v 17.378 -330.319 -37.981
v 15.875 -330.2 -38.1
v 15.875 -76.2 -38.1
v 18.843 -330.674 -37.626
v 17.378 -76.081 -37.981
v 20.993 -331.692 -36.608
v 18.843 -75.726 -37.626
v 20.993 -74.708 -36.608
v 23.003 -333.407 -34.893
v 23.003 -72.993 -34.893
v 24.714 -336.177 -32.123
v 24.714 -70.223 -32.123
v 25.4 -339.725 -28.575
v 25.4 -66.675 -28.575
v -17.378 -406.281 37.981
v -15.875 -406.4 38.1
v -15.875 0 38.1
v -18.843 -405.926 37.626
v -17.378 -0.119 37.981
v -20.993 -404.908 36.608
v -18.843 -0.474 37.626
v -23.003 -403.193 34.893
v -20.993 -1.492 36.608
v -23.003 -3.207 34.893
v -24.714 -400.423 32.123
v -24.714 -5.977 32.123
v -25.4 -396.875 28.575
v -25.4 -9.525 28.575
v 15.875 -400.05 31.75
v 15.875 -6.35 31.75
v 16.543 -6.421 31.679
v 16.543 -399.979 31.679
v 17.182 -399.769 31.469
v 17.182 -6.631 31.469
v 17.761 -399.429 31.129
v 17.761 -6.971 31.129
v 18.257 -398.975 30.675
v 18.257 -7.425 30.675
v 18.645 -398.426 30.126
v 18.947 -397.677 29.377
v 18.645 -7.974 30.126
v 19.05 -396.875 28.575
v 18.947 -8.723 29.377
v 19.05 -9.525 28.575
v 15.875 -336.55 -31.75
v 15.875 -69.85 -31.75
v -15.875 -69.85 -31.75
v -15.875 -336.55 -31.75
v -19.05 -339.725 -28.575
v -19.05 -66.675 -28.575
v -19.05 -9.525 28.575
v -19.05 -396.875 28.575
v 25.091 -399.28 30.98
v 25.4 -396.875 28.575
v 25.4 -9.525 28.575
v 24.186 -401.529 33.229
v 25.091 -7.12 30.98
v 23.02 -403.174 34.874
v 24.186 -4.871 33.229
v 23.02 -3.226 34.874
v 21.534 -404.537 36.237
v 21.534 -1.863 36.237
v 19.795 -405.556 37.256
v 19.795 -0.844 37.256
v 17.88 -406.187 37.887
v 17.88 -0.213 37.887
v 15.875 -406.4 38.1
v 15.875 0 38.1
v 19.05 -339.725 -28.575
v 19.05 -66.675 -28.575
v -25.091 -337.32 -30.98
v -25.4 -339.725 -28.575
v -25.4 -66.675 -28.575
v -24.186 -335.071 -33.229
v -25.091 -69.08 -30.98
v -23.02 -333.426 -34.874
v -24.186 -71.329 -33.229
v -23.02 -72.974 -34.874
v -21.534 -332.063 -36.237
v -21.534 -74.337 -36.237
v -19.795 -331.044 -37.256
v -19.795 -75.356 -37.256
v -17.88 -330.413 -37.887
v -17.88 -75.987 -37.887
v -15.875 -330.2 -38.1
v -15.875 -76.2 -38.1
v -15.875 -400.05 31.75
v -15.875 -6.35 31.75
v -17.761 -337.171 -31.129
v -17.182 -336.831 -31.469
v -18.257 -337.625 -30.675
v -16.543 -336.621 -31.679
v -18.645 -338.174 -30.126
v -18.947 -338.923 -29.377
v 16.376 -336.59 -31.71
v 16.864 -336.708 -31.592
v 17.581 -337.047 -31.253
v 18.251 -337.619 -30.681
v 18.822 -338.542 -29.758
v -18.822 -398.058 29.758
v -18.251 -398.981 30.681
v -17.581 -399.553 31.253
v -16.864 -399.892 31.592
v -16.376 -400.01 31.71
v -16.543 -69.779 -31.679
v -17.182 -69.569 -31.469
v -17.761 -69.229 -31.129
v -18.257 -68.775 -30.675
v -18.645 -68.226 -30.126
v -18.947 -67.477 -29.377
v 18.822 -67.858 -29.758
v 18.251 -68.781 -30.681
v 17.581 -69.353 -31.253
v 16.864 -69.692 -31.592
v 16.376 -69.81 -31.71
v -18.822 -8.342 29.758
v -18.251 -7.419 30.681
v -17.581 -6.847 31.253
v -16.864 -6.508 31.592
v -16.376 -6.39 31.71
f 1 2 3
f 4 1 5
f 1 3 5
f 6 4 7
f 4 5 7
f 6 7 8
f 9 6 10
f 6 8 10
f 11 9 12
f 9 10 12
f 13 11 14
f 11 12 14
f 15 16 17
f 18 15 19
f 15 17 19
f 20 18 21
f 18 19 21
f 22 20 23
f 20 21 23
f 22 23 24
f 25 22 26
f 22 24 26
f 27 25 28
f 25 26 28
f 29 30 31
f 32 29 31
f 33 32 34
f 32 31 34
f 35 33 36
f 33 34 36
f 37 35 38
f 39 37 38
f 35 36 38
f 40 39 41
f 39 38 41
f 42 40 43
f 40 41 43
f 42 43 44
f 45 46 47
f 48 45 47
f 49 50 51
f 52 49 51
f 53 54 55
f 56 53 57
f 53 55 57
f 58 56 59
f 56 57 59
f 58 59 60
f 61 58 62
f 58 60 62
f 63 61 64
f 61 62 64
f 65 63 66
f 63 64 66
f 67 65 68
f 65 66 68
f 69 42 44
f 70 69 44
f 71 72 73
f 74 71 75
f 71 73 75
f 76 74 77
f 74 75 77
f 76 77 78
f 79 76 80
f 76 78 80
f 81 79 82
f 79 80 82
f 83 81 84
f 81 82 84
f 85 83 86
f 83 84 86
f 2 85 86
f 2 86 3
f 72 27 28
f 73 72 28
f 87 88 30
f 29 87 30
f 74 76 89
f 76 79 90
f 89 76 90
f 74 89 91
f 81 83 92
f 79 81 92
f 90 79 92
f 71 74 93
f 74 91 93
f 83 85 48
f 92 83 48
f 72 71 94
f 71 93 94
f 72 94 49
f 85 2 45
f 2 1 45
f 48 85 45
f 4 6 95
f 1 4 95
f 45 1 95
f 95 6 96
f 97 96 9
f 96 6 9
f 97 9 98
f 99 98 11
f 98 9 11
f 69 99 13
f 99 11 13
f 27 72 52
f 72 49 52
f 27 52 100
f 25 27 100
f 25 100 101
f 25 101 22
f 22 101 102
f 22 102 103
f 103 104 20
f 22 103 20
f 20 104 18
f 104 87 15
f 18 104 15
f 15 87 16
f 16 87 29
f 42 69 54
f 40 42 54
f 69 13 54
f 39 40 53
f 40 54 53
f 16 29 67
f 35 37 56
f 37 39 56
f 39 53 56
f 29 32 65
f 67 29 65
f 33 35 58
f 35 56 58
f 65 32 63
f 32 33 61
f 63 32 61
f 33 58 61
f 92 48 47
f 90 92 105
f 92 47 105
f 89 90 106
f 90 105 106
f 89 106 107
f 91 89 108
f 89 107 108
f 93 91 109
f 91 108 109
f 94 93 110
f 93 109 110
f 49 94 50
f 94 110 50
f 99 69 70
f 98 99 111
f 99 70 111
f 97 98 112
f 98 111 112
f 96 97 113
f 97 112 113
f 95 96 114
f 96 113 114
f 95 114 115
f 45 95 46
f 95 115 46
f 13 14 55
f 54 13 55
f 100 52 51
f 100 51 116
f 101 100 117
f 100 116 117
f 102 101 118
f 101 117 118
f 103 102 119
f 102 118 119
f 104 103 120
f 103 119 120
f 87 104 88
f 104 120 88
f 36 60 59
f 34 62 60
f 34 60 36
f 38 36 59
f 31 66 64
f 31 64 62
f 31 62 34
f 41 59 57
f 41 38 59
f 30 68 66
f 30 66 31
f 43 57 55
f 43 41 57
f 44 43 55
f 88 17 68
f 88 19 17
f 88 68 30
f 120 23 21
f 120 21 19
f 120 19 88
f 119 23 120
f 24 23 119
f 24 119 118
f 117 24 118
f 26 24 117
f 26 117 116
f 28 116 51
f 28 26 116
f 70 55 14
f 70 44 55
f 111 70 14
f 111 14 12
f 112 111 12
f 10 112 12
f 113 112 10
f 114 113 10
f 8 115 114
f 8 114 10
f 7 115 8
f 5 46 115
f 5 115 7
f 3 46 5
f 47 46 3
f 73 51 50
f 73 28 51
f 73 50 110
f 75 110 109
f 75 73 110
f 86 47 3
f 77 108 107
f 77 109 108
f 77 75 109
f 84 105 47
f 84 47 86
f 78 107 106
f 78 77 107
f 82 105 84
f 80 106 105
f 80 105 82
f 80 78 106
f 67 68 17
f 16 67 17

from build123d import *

# Parameters (mm, degrees)
F1_DEPTH = 406.4
F3_DEPTH = 50.8


with BuildPart() as f1:
    # F0 (on Front) → F1 (new body)
    with BuildSketch(Plane.XZ):
        with BuildLine():
            ThreePointArc((-25.4, -28.575), (-22.6101920908, -35.3101920908), (-15.875, -38.1))
            Line((-15.875, -38.1), (15.875, -38.1))
            ThreePointArc((15.875, -38.1), (22.6101920908, -35.3101920908), (25.4, -28.575))
            Line((25.4, -28.575), (25.4, 28.575))
            ThreePointArc((25.4, 28.575), (22.6101920908, 35.3101920908), (15.875, 38.1))
            Line((15.875, 38.1), (-15.875, 38.1))
            ThreePointArc((-15.875, 38.1), (-22.6101920908, 35.3101920908), (-25.4, 28.575))
            Line((-25.4, 28.575), (-25.4, -28.575))
        make_face()
        with BuildLine():
            ThreePointArc((19.0500010133, -28.575), (18.1200647468, -30.8200647468), (15.875, -31.7500010133))
            Line((15.875, -31.7500010133), (-15.875, -31.7500010133))
            ThreePointArc((-15.875, -31.7500010133), (-18.1200647468, -30.8200647468), (-19.0500010133, -28.575))
            Line((-19.0500010133, -28.575), (-19.0500010133, 28.575))
            ThreePointArc((-19.0500010133, 28.575), (-18.1200647468, 30.8200647468), (-15.875, 31.7500010133))
            Line((-15.875, 31.7500010133), (15.875, 31.7500010133))
            ThreePointArc((15.875, 31.7500010133), (18.1200647468, 30.8200647468), (19.0500010133, 28.575))
            Line((19.0500010133, 28.575), (19.0500010133, -28.575))
        make_face(mode=Mode.SUBTRACT)
    extrude(amount=F1_DEPTH)

    # F2 (on Right) → F3 (cut, symmetric)
    with BuildSketch(Plane.YZ):
        Polygon((0, -38.1), (0, 38.1), (-76.2, -38.1), align=None)
        Polygon((-330.2, -38.1), (-406.4, 38.1), (-406.4, -38.1), align=None)
    extrude(amount=F3_DEPTH, both=True, mode=Mode.SUBTRACT)


with BuildPart() as f4_1:
    # F4: copy of F1
    add(f1.part)


solid = f1.part
